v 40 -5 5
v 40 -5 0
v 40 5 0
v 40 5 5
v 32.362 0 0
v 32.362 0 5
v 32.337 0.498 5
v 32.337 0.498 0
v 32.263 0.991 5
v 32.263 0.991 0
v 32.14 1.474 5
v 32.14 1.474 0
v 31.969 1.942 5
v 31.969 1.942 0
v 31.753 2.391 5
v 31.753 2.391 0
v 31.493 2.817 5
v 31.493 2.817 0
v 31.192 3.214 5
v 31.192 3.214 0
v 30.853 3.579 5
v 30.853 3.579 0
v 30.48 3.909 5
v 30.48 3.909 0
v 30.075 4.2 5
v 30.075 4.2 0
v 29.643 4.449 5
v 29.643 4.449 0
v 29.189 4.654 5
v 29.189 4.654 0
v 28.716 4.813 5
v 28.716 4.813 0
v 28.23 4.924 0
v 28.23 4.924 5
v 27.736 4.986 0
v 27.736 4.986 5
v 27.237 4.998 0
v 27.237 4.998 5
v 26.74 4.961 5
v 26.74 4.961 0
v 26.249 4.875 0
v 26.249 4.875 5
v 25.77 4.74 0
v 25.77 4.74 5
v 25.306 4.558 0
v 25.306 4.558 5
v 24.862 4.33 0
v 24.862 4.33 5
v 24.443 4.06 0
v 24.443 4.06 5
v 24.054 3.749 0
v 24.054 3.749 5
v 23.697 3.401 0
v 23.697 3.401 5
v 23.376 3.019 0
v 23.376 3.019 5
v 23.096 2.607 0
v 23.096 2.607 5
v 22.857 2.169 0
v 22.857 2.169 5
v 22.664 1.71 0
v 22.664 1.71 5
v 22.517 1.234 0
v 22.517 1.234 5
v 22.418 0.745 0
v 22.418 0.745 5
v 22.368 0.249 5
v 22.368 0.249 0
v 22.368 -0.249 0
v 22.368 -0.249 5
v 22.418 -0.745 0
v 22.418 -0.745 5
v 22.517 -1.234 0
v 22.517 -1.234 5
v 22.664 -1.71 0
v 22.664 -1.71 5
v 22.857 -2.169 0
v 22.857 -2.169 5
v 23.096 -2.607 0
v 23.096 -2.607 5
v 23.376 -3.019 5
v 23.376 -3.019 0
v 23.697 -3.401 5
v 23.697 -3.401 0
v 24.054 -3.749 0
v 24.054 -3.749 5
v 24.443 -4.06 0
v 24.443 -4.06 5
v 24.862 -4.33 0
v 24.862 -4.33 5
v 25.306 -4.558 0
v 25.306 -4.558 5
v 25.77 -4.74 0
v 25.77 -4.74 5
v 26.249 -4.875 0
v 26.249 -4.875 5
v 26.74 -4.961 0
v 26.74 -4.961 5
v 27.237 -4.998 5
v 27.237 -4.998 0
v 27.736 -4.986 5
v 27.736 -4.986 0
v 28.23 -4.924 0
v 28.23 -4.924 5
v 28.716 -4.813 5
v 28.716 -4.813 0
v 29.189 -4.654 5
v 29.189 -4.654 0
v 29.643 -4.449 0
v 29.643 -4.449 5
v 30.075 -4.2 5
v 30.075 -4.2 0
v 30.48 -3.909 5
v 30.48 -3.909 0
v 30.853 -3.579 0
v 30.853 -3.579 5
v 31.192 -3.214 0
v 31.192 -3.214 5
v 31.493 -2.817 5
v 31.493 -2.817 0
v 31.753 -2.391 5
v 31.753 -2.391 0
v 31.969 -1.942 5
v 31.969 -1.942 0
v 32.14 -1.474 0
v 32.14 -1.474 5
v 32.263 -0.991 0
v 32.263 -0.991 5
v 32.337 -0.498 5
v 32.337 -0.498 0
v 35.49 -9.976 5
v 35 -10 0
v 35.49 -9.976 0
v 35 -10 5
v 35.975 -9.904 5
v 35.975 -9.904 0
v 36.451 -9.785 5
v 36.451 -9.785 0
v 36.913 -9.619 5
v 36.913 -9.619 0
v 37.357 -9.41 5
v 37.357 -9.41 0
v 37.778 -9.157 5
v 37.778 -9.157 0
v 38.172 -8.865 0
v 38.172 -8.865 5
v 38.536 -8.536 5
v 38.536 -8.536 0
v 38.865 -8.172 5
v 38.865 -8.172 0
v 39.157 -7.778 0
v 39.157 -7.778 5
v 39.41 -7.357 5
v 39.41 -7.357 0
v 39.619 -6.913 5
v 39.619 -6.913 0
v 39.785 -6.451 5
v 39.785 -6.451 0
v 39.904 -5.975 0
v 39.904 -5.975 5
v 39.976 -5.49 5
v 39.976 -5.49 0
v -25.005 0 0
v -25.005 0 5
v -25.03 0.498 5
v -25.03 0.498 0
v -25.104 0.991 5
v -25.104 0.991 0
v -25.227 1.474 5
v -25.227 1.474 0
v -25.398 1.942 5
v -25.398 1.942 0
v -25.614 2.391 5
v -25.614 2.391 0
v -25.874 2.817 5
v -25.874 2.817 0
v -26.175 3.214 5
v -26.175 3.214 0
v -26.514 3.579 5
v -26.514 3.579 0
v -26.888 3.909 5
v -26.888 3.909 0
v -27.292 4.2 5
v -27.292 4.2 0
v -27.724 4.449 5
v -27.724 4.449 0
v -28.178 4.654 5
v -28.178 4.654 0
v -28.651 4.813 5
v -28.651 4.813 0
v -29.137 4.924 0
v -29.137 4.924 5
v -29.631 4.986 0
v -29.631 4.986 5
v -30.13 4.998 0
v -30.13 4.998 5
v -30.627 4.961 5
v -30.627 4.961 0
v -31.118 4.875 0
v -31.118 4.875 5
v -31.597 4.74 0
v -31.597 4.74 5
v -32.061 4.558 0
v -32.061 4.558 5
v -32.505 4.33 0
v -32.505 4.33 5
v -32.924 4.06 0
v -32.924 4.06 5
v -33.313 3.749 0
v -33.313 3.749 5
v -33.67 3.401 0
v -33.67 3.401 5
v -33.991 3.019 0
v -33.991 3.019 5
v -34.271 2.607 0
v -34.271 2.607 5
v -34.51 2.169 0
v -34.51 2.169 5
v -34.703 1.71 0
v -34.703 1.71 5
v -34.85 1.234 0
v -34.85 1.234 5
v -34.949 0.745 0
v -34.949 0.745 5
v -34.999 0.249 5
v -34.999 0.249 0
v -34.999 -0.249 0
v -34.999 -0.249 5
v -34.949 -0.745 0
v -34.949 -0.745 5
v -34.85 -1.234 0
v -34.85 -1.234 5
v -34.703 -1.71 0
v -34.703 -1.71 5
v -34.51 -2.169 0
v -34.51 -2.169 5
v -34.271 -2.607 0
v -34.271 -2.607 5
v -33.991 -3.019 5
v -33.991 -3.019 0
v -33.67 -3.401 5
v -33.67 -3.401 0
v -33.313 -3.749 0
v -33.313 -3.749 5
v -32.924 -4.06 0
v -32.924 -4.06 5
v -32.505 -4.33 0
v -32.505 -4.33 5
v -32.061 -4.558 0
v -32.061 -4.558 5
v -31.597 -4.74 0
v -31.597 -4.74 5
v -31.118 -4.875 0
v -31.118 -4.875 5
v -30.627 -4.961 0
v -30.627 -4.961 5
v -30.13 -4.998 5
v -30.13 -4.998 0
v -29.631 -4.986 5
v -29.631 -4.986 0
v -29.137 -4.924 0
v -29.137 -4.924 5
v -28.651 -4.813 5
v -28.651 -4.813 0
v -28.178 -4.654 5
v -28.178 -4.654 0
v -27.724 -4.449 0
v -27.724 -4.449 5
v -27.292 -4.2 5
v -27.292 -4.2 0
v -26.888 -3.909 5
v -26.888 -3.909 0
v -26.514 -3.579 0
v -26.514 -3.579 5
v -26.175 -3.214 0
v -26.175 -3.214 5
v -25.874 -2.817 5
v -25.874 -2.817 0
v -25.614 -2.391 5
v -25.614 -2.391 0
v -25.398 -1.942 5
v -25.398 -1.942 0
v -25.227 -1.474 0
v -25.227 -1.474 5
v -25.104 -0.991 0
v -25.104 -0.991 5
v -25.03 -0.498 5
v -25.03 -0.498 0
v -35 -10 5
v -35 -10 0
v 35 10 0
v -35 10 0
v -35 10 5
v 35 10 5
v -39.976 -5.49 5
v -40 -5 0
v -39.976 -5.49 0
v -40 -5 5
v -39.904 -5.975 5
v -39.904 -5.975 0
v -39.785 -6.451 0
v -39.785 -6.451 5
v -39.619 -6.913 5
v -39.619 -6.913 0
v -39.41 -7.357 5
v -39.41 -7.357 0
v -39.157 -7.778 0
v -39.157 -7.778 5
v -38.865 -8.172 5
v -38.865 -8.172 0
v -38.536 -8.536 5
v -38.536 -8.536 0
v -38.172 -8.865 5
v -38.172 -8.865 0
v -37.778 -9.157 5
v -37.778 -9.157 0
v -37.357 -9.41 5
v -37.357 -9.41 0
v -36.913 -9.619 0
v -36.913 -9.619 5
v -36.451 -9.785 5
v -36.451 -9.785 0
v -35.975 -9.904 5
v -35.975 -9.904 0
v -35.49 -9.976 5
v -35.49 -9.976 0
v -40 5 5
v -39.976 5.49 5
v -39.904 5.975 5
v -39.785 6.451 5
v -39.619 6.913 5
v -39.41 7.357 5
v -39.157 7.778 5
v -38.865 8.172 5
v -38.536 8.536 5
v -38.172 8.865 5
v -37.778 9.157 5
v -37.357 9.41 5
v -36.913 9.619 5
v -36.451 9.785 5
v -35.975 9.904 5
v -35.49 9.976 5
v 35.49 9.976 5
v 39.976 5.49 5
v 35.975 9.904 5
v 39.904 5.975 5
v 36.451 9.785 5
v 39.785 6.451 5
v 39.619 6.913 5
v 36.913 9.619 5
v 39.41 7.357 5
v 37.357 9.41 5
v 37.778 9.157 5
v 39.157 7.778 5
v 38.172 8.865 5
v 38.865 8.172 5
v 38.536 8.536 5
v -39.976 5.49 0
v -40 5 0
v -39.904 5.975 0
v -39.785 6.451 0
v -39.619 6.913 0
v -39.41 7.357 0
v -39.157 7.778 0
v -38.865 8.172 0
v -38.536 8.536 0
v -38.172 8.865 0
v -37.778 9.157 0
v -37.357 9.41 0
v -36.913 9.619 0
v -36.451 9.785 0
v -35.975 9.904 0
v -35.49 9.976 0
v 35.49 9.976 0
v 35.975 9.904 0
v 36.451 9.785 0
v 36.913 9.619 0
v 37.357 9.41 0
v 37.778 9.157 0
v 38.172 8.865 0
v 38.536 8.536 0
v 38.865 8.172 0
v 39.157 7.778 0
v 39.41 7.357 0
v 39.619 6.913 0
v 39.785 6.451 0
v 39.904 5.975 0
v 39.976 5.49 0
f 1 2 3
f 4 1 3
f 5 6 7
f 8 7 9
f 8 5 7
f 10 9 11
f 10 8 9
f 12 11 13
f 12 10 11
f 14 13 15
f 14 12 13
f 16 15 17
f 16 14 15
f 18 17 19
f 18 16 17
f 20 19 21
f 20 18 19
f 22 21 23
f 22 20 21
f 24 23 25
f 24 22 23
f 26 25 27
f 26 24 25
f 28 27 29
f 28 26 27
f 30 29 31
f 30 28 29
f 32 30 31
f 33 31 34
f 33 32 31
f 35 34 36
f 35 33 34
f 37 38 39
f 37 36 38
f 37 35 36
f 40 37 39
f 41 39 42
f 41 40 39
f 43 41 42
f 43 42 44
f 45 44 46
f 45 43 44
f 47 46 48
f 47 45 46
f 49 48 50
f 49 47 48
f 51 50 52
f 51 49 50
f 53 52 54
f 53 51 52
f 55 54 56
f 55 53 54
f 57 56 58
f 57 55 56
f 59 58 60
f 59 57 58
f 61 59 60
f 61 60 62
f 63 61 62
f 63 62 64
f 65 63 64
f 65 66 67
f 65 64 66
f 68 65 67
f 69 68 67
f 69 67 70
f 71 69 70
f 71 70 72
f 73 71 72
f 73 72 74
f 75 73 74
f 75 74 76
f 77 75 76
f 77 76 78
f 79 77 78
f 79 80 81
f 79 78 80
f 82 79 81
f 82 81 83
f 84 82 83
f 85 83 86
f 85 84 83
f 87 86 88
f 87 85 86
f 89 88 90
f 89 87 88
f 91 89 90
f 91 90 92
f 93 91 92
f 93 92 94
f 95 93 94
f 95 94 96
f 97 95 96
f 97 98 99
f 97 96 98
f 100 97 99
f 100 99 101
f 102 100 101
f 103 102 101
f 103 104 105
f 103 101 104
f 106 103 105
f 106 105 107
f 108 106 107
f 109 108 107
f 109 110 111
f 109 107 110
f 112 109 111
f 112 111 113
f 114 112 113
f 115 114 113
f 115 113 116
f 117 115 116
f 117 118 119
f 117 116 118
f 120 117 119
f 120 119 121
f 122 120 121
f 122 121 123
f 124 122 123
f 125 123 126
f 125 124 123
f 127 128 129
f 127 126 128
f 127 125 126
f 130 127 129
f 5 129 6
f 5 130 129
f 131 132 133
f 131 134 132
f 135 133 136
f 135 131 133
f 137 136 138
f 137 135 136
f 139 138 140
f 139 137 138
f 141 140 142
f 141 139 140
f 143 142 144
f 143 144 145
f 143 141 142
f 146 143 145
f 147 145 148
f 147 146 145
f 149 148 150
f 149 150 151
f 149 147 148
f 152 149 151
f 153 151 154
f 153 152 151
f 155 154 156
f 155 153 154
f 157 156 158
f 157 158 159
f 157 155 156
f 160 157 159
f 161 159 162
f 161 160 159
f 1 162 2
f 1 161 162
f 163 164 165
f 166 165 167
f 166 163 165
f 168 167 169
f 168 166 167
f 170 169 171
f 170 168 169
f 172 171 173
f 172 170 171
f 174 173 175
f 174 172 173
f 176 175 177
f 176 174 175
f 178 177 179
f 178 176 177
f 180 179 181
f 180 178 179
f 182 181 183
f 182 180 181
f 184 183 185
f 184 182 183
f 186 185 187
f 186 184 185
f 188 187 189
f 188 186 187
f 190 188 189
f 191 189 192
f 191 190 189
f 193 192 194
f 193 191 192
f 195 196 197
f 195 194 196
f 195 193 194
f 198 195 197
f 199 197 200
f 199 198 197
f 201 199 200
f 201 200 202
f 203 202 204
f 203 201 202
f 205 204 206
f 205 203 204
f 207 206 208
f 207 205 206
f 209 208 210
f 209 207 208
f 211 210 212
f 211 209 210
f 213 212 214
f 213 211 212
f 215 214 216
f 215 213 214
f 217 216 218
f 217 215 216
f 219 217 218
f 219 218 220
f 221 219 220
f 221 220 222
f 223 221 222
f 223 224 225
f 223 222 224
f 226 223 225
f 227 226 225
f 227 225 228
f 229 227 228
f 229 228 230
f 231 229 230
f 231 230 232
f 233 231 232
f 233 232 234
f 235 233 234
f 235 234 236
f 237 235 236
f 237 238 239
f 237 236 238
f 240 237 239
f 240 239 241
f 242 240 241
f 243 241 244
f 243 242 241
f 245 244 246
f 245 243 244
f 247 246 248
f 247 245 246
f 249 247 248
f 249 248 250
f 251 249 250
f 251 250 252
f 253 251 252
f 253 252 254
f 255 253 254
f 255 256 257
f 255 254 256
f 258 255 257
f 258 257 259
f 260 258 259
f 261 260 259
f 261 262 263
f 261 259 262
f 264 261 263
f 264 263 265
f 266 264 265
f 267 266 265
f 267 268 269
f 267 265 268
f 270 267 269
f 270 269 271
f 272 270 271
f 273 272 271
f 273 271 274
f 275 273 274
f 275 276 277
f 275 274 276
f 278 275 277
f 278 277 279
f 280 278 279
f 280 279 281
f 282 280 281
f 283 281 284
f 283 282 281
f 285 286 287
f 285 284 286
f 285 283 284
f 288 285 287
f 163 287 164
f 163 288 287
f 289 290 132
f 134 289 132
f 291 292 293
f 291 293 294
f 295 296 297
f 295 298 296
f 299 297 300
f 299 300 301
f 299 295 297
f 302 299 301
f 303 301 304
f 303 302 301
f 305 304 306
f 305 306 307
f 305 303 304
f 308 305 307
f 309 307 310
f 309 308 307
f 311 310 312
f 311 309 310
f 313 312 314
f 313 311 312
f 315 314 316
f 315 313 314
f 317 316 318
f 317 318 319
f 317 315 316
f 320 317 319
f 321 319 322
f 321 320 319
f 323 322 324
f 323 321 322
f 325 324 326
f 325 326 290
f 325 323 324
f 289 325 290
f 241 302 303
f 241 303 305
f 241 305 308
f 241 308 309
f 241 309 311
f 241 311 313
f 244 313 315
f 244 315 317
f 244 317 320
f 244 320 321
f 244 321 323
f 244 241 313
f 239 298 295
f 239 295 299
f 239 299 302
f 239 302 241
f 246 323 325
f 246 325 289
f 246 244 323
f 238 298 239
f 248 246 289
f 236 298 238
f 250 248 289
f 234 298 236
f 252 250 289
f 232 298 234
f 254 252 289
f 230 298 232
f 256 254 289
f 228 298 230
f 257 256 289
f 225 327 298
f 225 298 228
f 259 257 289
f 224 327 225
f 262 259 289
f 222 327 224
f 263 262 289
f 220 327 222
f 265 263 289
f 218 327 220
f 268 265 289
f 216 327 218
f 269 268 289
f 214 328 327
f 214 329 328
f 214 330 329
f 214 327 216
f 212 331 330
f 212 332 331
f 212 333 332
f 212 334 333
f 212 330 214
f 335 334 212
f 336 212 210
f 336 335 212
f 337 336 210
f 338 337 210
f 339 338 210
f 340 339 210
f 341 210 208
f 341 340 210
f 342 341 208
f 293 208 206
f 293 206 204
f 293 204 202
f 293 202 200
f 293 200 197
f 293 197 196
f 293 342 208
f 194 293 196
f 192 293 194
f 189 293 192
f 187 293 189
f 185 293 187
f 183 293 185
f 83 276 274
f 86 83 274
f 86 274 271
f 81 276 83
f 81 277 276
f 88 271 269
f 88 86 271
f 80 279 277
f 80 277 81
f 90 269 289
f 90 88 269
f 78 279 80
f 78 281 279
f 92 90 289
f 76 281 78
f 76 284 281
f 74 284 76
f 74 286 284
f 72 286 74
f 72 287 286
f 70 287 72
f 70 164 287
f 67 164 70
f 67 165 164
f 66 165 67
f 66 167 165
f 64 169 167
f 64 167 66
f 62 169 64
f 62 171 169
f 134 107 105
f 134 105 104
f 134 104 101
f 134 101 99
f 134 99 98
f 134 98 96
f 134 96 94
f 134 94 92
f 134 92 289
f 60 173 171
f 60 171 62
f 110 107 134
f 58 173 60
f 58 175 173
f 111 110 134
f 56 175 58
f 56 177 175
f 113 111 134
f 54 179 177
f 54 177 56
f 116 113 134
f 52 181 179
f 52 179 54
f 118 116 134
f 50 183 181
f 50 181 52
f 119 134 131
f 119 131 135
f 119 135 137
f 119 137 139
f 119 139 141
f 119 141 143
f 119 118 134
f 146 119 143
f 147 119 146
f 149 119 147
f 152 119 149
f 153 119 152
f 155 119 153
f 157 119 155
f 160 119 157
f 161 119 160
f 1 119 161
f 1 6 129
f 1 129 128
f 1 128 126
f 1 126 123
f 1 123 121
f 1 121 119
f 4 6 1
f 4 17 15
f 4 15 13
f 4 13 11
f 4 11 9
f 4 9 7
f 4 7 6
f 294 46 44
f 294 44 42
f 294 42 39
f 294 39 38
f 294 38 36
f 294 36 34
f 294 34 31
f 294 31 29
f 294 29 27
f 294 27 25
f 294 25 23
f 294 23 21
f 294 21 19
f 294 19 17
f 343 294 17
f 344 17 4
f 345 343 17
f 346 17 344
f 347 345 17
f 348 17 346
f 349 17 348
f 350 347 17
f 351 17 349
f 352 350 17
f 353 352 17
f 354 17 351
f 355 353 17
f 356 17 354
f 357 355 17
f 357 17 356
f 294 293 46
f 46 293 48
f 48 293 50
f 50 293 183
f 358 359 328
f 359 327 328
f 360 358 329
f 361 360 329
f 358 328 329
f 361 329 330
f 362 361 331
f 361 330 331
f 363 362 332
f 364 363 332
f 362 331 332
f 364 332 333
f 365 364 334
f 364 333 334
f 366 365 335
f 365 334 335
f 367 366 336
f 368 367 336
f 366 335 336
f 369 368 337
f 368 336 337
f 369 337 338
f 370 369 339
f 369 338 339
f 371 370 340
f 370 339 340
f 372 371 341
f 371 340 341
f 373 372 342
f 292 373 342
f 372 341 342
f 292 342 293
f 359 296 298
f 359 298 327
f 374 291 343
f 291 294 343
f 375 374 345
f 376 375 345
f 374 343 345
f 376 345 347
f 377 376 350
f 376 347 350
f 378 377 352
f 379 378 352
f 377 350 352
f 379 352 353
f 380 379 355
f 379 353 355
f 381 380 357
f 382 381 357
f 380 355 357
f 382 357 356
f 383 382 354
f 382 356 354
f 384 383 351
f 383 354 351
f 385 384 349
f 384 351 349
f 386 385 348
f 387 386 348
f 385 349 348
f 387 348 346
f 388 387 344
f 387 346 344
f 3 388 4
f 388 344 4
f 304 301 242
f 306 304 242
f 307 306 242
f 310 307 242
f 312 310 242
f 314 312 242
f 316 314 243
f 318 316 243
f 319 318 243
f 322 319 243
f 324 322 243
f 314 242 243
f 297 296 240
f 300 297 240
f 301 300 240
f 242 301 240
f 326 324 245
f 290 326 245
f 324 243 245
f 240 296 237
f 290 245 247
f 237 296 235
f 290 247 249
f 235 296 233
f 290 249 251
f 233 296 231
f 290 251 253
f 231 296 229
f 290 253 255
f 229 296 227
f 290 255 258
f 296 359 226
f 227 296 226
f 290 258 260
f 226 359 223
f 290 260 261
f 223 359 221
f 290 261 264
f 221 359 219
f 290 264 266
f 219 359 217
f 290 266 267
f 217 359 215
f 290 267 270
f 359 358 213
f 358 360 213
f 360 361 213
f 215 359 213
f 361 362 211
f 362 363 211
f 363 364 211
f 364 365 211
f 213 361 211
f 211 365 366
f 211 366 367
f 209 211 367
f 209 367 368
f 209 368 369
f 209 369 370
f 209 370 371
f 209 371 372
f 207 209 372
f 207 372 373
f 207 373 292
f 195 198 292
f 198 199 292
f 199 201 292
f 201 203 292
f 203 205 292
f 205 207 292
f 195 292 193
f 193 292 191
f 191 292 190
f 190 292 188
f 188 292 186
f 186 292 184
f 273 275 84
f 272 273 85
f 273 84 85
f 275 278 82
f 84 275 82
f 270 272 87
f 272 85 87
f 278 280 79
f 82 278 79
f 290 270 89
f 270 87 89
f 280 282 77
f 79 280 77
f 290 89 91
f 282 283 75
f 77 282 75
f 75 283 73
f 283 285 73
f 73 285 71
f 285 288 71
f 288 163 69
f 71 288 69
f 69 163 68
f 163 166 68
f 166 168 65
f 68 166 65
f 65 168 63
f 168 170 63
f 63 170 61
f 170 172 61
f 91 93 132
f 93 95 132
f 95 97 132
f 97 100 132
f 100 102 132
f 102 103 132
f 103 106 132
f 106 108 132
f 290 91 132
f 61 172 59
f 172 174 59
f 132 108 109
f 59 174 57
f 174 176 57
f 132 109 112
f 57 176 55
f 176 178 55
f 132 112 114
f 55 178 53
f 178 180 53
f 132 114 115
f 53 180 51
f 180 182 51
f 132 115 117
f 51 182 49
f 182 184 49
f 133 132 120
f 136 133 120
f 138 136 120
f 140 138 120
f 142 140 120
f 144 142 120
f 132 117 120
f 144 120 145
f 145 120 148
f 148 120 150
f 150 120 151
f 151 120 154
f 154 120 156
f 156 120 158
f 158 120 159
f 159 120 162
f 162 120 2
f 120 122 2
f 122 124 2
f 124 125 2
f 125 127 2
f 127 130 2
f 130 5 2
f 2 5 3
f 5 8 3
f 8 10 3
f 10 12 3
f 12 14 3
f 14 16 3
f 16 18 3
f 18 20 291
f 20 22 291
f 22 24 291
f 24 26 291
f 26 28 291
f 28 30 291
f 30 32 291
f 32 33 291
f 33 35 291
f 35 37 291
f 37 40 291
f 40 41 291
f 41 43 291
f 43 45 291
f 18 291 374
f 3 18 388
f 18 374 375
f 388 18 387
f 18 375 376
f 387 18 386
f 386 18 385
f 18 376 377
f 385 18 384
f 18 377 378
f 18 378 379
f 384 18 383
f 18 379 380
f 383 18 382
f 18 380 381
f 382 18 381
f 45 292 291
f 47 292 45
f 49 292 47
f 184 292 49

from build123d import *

# Parameters (mm, degrees)
F0_W     = 80
F0_H     = 20
F1_DEPTH = 5
F2_R     = 5
F3_DEPTH = 5.001
F4_R     = 5


with BuildPart() as f1:
    # F0 (on Top) → F1 (new body)
    with BuildSketch(Plane.XY):
        Rectangle(F0_W, F0_H)
    extrude(amount=F1_DEPTH)

    # F2 (on Top) → F3 (cut, through all)
    with BuildSketch(Plane.XY):
        with Locations((-30.004952, 0)):
            Circle(F2_R)
        with Locations((27.362093, 0)):
            Circle(F2_R)
    extrude(amount=F3_DEPTH, mode=Mode.SUBTRACT)

    # F4
    f4_edges = [f1.edges().sort_by_distance(p)[0] for p in [
        (40, -10, 2.5),
        (40, 10, 2.5),
        (-40, -10, 2.5),
        (-40, 10, 2.5),
    ]]
    fillet(f4_edges, radius=F4_R)


solid = f1.part
